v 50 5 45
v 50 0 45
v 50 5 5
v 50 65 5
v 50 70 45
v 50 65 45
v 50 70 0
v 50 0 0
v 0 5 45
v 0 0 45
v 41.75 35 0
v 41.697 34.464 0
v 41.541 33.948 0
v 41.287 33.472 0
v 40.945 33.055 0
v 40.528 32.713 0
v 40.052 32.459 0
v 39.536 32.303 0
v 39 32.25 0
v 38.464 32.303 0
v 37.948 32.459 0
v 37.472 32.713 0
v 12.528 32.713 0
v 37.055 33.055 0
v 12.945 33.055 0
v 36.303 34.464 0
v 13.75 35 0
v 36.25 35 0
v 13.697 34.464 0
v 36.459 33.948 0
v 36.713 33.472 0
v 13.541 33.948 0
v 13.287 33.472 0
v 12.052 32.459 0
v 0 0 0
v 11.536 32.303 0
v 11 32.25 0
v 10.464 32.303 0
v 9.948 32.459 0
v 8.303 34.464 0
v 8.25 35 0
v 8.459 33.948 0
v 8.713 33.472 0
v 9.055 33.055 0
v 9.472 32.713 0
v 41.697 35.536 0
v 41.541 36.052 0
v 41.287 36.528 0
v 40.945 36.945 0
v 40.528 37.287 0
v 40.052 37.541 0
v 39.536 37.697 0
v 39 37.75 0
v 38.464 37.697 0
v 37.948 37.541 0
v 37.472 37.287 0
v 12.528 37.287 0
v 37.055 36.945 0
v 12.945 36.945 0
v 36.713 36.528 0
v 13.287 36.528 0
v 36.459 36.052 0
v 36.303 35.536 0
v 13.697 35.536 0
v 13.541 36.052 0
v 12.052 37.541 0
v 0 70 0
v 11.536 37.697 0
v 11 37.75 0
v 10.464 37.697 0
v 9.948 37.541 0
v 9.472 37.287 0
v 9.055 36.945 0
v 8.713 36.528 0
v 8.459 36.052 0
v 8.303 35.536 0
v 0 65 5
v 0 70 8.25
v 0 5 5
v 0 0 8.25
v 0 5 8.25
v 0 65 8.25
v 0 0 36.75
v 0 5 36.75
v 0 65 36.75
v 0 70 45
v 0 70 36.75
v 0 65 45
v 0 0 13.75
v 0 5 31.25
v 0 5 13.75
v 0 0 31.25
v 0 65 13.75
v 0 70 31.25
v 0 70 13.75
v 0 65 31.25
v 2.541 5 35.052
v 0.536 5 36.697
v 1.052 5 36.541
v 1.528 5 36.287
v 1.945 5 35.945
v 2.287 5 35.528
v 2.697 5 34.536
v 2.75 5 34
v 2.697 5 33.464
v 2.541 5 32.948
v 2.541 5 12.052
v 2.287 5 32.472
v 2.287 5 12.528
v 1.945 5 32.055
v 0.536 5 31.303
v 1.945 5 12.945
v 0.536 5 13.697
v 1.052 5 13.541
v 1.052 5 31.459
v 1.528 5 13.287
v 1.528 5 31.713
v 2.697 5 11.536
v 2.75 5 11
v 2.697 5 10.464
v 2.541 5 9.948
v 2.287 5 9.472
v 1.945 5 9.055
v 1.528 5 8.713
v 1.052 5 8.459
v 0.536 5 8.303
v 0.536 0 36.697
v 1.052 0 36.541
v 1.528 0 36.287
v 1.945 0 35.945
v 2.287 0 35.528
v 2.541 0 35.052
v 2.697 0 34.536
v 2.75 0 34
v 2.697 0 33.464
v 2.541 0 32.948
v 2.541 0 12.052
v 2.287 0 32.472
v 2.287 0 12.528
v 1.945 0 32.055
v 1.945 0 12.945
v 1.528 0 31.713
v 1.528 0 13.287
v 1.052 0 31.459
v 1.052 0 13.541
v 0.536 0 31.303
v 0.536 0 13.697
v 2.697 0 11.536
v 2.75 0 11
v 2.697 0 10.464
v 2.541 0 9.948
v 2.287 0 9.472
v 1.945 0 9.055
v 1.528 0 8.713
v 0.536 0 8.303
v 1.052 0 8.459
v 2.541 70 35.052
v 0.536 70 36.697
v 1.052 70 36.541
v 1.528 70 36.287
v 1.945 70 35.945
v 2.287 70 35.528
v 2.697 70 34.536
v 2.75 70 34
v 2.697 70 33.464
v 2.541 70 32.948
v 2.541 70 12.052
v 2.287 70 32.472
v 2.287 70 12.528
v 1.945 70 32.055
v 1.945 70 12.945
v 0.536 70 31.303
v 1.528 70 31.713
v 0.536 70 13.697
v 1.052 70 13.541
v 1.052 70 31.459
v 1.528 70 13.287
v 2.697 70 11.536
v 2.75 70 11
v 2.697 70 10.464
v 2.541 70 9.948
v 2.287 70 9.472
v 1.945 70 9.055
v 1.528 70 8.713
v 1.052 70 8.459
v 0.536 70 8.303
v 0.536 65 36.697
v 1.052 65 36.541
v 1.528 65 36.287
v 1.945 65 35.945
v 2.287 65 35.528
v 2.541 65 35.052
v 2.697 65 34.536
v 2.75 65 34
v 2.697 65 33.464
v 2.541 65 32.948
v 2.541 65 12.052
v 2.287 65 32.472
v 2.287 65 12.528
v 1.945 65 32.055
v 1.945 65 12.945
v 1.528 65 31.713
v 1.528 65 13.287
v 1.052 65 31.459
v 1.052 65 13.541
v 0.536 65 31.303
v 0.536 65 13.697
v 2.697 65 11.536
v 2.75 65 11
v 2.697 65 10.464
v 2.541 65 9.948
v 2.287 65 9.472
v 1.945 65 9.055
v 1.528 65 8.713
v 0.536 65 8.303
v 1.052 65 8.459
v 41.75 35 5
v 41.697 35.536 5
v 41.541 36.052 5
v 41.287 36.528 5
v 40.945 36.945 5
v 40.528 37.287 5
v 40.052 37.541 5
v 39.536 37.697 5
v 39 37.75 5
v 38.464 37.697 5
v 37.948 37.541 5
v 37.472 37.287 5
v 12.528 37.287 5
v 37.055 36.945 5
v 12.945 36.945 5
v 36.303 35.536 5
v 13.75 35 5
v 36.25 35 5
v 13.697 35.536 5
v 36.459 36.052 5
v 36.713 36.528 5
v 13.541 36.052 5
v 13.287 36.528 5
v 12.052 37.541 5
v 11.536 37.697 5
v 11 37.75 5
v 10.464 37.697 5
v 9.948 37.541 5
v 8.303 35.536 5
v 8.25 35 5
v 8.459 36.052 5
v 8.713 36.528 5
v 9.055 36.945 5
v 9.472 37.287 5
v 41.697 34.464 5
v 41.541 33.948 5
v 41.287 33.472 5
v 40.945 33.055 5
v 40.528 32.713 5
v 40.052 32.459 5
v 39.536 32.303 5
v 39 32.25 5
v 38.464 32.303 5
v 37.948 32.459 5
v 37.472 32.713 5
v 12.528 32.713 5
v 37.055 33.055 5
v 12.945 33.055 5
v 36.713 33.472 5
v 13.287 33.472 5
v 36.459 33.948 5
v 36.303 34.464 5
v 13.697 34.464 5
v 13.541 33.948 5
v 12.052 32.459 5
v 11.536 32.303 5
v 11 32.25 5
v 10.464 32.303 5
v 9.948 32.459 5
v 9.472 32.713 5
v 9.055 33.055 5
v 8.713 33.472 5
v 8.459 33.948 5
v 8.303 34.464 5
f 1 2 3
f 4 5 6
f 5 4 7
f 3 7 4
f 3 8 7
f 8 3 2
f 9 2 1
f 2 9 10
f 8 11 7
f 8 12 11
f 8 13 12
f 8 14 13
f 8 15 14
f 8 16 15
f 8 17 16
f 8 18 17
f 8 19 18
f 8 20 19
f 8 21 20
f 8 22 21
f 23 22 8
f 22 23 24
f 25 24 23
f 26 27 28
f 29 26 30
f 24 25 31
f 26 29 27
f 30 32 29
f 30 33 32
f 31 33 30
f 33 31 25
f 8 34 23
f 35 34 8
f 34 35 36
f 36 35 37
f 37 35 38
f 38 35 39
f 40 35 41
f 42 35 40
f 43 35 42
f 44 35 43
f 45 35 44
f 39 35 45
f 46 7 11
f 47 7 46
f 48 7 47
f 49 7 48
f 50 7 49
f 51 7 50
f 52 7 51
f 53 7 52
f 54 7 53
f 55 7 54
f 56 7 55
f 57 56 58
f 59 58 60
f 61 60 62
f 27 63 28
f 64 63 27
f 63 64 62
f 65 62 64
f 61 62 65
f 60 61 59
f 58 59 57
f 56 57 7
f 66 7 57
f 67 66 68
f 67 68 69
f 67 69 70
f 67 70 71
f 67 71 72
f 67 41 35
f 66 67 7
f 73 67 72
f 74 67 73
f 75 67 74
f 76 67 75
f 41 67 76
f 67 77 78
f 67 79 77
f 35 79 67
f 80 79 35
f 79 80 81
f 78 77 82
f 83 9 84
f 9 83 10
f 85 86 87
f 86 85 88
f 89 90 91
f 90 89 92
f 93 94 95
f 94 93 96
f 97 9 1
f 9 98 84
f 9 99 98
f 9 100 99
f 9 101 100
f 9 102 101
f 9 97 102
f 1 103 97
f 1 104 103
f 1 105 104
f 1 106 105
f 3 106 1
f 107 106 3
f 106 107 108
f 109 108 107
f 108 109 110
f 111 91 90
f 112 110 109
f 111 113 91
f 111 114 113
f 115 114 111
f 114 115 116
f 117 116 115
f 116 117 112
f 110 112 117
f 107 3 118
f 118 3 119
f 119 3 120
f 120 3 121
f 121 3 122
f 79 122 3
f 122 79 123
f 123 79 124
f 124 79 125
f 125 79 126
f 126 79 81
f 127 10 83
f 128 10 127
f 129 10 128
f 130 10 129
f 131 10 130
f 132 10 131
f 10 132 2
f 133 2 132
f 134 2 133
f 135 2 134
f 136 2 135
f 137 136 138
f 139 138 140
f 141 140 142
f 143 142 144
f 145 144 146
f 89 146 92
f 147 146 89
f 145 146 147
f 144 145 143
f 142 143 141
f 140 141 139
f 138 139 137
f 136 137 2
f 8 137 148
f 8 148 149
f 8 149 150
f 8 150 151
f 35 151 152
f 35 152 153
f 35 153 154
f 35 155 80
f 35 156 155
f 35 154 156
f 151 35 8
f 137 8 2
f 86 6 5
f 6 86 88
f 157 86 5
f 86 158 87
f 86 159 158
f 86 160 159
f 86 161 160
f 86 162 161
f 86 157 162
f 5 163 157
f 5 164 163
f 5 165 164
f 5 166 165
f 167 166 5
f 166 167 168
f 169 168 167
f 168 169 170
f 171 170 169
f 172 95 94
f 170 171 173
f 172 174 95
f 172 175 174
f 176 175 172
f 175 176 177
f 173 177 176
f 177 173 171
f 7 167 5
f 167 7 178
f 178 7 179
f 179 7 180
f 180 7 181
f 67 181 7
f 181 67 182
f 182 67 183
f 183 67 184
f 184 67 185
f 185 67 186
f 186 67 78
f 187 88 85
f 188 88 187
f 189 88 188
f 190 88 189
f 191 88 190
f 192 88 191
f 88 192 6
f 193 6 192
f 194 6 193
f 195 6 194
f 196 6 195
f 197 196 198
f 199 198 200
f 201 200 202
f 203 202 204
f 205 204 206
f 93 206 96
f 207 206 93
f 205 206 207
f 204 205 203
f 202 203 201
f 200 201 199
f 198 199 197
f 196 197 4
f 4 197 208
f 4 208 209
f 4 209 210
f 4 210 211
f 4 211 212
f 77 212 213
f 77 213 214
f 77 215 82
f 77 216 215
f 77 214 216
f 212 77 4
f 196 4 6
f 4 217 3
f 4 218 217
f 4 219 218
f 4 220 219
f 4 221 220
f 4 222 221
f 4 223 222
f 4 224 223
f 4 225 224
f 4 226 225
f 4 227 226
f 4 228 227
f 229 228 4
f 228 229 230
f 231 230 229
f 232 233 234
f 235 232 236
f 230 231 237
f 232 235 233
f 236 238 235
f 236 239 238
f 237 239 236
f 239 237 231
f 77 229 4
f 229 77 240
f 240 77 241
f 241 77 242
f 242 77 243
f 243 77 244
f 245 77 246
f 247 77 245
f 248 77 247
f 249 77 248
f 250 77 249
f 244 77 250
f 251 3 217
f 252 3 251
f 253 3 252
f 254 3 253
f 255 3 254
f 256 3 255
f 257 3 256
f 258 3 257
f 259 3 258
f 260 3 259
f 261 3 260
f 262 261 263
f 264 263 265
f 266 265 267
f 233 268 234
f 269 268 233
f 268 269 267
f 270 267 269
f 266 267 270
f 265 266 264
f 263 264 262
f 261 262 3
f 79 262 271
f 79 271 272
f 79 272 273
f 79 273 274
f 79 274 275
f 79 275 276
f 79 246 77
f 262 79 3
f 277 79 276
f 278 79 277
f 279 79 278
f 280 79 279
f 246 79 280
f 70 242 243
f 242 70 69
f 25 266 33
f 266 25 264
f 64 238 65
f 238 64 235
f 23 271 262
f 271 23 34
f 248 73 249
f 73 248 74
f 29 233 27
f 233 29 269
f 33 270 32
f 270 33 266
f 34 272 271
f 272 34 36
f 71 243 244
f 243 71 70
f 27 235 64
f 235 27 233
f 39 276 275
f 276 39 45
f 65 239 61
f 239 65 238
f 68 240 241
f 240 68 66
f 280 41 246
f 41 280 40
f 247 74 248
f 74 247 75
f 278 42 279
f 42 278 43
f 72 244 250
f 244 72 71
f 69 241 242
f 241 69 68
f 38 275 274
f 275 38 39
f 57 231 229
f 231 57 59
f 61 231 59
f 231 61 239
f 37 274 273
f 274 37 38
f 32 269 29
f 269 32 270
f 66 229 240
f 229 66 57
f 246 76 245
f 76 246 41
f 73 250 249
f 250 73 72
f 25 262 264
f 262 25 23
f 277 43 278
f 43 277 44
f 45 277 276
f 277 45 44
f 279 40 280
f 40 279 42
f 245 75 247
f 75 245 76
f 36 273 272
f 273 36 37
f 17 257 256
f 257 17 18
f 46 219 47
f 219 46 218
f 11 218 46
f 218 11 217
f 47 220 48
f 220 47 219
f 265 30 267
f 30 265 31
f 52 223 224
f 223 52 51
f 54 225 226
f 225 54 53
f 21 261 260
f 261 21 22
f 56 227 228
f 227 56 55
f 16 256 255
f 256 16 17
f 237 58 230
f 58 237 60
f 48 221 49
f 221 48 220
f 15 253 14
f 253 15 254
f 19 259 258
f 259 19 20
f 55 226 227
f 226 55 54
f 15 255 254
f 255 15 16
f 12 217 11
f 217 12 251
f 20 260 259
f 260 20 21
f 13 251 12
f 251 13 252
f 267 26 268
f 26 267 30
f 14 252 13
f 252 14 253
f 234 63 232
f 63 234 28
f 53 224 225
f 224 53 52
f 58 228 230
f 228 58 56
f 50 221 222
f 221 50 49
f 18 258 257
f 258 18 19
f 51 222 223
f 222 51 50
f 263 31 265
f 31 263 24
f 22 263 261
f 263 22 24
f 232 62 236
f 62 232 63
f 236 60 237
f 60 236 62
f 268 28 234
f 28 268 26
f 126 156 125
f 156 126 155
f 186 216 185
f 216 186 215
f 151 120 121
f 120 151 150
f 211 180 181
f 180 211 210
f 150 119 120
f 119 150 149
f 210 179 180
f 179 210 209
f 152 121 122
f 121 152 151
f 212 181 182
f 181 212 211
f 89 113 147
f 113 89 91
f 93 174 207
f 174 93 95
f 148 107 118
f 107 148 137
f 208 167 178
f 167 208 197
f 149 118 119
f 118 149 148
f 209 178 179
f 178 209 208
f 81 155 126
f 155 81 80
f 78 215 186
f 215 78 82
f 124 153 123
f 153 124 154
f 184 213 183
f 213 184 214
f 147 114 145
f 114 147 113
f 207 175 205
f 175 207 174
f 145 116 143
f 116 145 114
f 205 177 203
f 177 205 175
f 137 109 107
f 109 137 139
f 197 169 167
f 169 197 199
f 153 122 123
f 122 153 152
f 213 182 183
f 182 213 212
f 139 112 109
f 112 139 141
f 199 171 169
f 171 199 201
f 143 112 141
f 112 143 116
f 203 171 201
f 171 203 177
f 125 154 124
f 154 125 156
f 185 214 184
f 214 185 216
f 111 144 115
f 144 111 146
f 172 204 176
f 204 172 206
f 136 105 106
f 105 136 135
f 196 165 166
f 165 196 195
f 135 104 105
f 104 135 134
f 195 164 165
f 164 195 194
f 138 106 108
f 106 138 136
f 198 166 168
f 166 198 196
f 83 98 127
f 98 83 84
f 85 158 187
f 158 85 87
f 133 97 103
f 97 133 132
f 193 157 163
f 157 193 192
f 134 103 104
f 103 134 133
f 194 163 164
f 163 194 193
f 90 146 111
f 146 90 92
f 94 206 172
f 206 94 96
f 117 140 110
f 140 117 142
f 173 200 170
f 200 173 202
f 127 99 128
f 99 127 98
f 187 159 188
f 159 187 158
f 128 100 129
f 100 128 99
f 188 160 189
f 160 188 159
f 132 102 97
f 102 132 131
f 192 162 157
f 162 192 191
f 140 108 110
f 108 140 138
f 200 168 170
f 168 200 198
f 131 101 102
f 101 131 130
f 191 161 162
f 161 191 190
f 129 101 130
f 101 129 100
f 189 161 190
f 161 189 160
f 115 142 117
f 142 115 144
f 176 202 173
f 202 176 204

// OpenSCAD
$fn = 32;

// ----------------------------------------------------------------------
// U-bracket: 50 x 70 x 45 mm
// ----------------------------------------------------------------------

// --- parameters (mm) ---
base_len = 50;            // outer length, X
channel_w = 70;           // outer width, Y
upright_h = 45;           // upright height, Z
mat_t = 5;                // wall thickness
hole_d = 5.5;             // clearance for M5

module hole_z(px, py) {
  translate([px, py, -0.5]) cylinder(h = mat_t + 1, d = hole_d);
}
module hole_y_pz(pz) {
  /* through both uprights along Y */
  translate([0, -0.5, pz]) rotate([-90, 0, 0]) cylinder(h = channel_w + 1, d = hole_d);
}

module base() {
  cube([base_len, channel_w, mat_t]);
}

module uprights() {
  cube([base_len, mat_t, upright_h]);
  translate([0, channel_w - mat_t, 0]) cube([base_len, mat_t, upright_h]);
}

difference() {
  union() {
    base();
    uprights();
  }
  hole_z(11, 35);
  hole_z(39, 35);
  hole_y_pz(11);
  hole_y_pz(34);
}
